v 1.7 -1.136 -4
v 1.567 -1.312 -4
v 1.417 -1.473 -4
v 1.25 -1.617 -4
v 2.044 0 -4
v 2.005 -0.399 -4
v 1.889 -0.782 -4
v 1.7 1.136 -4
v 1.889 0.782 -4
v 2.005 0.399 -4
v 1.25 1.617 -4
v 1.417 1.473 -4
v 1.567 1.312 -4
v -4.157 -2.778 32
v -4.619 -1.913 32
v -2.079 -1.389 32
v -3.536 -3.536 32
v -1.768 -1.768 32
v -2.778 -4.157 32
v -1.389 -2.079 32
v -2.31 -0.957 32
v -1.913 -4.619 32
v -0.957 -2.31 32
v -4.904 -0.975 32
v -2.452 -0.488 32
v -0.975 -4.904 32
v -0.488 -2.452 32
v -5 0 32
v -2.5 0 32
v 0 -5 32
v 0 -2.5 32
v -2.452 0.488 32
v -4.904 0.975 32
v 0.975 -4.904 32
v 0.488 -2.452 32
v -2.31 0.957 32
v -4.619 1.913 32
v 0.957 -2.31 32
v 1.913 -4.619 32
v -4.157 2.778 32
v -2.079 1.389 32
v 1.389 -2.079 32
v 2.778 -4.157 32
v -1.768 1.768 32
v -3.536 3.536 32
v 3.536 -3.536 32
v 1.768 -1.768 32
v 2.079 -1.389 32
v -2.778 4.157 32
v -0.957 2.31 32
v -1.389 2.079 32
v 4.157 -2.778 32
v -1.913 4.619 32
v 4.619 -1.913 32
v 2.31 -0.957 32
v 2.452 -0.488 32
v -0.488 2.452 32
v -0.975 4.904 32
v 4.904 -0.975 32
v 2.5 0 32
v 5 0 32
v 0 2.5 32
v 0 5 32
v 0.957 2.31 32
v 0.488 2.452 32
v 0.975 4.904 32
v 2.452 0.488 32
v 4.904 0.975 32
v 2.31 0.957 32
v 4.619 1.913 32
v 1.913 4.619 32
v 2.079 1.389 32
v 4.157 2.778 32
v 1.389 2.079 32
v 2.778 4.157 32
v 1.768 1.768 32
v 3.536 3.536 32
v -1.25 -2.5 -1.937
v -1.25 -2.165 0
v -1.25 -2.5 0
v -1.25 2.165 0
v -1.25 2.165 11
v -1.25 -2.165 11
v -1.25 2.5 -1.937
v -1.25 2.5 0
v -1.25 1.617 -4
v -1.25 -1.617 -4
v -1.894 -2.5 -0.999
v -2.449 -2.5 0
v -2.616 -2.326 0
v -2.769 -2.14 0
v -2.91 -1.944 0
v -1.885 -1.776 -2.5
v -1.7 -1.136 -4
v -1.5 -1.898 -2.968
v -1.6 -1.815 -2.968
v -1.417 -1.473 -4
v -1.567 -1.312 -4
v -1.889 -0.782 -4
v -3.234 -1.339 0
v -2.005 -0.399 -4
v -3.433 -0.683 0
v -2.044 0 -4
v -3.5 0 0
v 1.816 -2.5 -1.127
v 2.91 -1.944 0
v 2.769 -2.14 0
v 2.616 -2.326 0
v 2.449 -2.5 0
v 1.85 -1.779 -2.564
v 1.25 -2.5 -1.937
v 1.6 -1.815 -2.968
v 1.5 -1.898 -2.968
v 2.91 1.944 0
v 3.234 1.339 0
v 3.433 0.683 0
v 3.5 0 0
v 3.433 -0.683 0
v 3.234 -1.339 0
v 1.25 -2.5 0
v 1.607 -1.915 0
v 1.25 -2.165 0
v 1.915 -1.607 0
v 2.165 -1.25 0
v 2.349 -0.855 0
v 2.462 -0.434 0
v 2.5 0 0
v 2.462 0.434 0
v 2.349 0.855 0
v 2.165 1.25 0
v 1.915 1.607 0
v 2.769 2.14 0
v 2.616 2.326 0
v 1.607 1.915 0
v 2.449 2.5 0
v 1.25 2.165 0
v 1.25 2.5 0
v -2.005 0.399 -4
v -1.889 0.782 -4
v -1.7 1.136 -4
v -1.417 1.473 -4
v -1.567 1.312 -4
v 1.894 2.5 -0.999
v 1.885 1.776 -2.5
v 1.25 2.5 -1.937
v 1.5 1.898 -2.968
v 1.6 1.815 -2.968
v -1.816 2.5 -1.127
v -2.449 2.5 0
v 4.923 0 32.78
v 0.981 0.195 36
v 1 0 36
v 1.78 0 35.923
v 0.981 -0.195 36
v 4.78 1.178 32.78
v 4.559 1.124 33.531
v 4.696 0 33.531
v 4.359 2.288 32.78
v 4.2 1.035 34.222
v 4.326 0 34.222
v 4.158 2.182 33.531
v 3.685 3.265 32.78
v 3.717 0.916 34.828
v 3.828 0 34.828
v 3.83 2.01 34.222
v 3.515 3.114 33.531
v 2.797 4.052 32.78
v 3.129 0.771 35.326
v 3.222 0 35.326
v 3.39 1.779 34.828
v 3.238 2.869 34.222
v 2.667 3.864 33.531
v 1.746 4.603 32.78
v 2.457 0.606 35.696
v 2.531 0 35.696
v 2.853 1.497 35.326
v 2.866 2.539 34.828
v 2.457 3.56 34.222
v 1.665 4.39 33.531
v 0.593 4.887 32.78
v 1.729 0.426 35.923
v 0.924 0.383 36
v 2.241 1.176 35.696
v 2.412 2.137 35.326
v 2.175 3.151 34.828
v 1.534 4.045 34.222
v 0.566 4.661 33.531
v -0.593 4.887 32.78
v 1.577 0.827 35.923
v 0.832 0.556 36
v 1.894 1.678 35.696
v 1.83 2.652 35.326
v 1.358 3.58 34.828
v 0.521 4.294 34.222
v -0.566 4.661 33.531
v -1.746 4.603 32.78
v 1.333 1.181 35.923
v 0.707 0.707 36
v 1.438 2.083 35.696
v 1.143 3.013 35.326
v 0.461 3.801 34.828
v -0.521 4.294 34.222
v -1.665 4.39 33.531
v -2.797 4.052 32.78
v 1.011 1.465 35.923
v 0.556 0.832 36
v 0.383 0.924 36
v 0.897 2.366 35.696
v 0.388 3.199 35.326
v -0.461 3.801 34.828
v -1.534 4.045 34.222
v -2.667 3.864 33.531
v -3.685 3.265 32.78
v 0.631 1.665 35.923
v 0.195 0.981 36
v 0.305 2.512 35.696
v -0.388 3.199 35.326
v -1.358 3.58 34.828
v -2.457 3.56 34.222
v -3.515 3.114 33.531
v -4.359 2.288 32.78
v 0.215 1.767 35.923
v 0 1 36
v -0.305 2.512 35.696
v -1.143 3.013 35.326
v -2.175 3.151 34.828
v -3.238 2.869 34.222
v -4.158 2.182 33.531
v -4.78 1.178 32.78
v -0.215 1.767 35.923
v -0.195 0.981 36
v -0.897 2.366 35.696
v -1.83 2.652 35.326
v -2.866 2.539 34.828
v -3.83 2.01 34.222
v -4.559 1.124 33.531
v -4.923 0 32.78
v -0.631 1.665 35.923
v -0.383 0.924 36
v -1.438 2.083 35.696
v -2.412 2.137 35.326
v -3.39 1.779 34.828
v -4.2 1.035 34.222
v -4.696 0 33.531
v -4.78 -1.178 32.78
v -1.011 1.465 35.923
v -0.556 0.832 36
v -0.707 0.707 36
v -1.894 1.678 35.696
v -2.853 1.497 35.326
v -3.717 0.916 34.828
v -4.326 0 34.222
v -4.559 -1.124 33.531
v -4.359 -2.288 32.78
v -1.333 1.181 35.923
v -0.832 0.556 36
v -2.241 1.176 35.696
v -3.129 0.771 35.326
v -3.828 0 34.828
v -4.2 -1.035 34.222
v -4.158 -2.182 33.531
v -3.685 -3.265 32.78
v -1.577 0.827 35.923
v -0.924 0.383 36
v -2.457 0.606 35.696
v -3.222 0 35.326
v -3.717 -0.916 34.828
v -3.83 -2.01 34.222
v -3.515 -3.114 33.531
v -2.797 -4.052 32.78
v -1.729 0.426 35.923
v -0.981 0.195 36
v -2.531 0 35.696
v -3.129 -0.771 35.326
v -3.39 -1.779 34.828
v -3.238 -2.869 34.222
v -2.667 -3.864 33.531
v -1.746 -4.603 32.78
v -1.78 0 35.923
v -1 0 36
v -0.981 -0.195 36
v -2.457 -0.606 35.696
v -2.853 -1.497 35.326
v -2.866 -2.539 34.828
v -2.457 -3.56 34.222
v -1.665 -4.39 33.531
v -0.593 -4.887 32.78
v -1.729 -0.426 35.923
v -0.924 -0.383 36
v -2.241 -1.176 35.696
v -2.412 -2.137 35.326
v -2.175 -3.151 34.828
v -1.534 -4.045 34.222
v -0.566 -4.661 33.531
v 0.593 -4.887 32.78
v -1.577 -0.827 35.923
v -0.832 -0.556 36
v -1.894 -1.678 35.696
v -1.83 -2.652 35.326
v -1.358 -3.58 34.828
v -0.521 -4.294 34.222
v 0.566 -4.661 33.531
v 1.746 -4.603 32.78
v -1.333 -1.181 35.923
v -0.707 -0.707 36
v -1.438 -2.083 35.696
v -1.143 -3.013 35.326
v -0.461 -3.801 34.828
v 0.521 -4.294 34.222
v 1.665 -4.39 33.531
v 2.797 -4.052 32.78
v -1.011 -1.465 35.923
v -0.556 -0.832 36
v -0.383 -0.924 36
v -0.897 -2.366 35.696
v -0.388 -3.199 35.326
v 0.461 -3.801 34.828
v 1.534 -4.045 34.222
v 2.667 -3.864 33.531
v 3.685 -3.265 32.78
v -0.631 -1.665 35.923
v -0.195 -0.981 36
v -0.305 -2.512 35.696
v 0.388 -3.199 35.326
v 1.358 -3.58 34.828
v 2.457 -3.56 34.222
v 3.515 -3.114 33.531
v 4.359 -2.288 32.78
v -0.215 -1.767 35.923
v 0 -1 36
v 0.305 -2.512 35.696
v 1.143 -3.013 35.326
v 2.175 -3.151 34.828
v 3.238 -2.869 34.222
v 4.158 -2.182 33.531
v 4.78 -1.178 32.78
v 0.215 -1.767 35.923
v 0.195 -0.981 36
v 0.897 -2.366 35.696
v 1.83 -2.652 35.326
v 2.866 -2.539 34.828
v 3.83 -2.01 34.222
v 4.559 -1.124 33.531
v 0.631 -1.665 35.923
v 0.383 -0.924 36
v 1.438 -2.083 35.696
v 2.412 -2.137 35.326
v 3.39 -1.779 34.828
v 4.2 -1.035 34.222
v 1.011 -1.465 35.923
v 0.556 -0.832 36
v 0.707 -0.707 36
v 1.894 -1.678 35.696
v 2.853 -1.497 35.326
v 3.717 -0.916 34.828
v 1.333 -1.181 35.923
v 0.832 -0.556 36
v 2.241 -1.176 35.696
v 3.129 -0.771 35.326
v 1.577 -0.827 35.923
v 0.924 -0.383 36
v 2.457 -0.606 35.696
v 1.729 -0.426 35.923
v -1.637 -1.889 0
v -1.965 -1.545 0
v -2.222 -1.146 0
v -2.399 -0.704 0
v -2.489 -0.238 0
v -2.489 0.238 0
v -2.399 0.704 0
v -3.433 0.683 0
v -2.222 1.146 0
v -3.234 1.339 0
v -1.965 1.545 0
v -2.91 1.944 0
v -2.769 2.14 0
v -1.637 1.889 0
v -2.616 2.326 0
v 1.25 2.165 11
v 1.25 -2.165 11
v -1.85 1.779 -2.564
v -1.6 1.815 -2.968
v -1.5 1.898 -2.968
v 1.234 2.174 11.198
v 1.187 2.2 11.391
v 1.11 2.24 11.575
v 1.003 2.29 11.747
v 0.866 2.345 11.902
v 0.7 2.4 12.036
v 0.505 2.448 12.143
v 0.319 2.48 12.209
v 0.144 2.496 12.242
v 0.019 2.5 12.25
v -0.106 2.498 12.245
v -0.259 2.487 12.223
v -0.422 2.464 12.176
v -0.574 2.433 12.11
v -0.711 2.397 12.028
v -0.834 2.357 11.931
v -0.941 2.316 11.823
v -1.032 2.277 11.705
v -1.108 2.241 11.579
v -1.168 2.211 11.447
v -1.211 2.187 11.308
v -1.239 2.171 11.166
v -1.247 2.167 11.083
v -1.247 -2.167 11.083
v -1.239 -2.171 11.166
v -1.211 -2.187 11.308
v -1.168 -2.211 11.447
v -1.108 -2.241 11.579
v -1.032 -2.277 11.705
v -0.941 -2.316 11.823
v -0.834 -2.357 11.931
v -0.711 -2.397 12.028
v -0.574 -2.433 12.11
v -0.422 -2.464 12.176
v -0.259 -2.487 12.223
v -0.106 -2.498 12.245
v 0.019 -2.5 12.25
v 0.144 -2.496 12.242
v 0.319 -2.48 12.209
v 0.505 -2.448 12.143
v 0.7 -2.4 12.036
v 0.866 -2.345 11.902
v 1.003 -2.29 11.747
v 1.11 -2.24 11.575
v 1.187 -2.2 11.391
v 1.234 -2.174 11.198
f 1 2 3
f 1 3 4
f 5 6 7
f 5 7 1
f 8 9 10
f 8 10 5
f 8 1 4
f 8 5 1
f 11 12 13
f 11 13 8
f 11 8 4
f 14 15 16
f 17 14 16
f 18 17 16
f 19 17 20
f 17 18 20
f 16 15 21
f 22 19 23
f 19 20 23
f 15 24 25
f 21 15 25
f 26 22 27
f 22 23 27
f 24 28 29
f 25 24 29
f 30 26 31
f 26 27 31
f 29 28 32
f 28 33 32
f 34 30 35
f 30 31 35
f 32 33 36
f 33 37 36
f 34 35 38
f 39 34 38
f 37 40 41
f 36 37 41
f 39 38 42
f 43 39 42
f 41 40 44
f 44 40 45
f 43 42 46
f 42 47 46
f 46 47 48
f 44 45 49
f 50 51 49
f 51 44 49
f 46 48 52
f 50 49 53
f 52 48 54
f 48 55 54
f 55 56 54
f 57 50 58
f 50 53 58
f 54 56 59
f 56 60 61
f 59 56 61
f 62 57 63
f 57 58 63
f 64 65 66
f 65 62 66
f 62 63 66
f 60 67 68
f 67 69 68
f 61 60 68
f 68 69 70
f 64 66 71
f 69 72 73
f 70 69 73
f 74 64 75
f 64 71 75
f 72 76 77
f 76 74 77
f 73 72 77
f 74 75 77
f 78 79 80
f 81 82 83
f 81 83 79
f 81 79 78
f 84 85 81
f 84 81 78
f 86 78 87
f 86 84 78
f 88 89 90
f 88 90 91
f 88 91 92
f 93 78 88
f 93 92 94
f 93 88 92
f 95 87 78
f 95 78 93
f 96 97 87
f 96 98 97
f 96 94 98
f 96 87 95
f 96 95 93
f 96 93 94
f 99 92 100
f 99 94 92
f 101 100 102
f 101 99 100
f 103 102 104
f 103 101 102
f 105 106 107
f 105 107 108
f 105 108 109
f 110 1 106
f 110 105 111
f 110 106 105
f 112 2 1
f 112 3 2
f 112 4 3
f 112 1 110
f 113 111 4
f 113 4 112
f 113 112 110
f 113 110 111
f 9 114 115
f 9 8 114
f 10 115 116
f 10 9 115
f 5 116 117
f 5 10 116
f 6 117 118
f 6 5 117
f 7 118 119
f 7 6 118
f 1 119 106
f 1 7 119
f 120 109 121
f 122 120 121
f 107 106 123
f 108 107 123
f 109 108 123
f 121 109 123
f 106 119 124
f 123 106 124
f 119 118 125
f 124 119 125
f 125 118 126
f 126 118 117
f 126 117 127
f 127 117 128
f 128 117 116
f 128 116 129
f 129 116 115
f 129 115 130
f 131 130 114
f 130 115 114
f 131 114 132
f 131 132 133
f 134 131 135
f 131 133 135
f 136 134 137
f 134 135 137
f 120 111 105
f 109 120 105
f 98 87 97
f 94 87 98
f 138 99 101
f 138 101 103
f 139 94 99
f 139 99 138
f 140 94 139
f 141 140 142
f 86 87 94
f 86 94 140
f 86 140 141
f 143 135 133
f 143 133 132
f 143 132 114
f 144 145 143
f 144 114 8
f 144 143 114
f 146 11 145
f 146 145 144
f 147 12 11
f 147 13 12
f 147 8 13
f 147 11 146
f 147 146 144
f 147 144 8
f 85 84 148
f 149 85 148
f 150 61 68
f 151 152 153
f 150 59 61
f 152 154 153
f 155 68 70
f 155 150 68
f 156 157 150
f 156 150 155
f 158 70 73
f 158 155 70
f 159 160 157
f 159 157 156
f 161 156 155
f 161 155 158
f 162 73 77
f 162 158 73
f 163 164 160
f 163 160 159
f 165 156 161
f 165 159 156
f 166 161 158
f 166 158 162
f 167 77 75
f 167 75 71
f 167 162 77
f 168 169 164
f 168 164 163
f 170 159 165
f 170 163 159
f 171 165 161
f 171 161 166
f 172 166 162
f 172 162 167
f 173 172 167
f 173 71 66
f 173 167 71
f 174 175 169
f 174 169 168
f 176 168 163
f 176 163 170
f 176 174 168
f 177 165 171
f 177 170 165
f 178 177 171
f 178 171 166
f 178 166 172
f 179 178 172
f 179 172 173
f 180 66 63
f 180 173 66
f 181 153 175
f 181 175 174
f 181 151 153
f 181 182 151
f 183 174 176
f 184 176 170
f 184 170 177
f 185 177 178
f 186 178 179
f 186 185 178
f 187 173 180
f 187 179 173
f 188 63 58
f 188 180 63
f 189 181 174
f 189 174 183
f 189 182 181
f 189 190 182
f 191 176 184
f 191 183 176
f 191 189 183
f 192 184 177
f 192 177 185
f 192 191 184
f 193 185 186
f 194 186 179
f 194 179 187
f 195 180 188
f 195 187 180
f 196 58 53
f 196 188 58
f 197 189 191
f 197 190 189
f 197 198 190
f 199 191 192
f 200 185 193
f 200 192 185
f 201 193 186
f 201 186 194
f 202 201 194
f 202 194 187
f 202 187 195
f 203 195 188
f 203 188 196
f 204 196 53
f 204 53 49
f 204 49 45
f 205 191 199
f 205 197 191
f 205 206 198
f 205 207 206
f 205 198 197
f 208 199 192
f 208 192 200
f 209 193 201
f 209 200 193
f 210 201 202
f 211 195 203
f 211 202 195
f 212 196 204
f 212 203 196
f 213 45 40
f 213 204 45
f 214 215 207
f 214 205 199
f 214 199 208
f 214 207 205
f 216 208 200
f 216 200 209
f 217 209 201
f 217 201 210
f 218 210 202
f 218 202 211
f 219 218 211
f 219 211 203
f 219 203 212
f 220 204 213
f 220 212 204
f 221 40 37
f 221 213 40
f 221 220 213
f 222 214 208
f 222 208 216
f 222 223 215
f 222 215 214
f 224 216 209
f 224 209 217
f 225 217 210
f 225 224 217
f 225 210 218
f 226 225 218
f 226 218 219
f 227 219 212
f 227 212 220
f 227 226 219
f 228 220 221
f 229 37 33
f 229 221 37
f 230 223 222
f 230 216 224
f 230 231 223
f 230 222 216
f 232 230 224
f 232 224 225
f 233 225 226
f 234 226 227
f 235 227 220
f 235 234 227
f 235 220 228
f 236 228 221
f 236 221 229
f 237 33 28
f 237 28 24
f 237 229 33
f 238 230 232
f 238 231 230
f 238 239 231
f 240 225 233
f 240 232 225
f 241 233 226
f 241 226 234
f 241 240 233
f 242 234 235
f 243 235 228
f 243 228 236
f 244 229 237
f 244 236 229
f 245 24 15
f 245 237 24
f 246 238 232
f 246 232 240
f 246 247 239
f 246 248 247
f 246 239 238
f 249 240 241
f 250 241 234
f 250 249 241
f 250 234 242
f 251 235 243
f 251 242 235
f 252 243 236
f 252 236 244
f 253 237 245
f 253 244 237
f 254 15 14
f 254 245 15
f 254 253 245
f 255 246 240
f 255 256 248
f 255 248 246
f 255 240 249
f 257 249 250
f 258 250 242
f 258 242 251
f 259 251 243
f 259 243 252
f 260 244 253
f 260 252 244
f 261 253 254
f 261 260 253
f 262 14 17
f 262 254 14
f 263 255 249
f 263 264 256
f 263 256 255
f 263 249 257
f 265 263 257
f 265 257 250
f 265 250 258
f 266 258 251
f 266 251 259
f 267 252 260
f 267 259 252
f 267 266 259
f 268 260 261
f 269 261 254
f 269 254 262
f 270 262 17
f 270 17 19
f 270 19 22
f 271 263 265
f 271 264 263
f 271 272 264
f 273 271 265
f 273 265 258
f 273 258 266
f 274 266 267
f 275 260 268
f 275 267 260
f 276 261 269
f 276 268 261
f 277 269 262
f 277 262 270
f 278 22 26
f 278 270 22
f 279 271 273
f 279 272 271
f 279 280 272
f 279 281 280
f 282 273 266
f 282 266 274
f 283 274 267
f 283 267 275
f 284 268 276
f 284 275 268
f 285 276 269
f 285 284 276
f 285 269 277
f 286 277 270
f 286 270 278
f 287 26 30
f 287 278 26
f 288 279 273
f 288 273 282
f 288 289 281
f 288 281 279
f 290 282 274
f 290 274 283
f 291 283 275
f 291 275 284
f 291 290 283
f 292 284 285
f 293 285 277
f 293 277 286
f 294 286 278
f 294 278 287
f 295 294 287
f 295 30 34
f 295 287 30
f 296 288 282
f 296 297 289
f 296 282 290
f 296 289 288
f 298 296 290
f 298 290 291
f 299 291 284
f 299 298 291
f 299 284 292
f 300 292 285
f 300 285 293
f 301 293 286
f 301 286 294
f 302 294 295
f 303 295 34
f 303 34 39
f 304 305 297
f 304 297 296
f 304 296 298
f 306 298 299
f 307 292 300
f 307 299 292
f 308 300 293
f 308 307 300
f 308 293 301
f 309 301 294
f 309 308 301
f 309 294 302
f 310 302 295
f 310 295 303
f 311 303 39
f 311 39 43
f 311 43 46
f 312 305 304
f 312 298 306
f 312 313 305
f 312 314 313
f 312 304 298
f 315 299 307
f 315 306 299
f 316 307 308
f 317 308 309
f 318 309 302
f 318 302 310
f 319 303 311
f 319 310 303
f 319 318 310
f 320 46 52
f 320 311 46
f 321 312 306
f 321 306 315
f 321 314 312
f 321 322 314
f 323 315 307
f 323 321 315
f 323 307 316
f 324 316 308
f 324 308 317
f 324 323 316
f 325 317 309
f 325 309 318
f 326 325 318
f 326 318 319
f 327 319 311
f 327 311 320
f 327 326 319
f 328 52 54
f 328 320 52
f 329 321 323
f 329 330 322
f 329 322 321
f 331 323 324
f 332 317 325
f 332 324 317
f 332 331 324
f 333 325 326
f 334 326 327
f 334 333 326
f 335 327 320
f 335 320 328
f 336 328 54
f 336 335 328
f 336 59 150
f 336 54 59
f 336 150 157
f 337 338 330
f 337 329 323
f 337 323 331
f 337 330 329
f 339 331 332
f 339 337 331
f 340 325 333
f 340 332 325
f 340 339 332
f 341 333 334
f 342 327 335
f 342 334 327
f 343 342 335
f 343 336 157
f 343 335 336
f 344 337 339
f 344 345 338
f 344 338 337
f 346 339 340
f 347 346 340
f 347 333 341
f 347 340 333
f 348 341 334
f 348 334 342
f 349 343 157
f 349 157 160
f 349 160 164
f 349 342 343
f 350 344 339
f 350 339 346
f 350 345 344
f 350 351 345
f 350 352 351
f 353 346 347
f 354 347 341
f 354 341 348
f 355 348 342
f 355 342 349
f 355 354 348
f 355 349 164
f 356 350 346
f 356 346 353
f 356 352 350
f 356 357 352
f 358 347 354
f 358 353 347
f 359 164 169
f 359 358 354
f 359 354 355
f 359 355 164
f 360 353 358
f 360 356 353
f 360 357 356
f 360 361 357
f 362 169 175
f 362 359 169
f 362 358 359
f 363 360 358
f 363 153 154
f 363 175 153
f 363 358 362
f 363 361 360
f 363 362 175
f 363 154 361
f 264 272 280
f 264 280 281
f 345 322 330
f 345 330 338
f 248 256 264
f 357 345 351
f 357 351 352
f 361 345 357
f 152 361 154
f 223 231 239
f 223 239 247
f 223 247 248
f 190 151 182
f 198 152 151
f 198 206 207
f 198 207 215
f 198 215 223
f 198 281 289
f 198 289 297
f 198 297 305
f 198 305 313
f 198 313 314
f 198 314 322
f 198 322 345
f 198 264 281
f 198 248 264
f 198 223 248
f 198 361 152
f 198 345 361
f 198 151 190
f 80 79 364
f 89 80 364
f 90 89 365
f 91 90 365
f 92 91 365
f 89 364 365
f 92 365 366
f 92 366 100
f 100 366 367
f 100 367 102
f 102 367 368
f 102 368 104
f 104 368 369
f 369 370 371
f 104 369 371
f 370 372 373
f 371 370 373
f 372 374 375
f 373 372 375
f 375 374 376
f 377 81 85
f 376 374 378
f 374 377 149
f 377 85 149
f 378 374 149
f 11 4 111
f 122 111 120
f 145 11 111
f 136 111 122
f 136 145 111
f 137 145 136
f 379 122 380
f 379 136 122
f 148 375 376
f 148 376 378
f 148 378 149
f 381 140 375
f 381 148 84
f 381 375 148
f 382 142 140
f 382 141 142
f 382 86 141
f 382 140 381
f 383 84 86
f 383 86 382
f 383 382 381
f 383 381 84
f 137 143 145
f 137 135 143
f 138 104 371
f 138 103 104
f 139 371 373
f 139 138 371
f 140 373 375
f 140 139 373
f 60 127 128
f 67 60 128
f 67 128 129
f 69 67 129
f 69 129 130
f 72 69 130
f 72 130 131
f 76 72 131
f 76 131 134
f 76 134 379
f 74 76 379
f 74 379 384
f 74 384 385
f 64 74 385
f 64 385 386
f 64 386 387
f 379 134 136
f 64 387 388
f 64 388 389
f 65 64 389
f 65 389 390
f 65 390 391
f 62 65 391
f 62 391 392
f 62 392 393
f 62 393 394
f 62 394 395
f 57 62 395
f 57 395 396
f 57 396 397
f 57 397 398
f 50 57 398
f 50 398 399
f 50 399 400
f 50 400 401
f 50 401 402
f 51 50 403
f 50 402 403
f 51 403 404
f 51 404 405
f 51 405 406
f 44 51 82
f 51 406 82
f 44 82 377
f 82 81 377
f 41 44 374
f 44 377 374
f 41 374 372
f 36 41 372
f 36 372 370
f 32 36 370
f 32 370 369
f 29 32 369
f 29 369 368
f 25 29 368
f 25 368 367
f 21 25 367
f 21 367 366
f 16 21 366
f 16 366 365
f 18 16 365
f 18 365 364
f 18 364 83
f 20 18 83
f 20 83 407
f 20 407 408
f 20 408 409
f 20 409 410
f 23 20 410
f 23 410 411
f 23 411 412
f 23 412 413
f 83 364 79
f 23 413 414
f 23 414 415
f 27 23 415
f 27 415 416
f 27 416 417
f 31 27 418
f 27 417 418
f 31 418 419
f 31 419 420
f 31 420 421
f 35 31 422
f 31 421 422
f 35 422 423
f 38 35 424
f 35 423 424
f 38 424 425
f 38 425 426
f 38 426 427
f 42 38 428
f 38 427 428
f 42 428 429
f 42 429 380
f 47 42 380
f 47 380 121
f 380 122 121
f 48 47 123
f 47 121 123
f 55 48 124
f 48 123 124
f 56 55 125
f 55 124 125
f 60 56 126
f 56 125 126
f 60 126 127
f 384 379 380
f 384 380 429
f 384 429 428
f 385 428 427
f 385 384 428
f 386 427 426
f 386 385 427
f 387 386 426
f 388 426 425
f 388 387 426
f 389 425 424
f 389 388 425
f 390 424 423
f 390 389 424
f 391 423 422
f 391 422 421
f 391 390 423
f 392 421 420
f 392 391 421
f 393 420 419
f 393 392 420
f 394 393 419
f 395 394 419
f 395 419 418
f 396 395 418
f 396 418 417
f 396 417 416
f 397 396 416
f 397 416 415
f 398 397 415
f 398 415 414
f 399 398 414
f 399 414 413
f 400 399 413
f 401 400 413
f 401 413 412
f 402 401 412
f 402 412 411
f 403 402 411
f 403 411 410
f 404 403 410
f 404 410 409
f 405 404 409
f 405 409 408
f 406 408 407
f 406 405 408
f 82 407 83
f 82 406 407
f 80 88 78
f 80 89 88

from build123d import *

# Parameters (mm, degrees)
SKETCH2_R           = 2.5
BOSS_EXTRUDE1_DEPTH = 32
BOSS_EXTRUDE2_DEPTH = 4
BOSS_EXTRUDE2_TAPER = 20
CUT_EXTRUDE1_DEPTH  = 6
CUT_EXTRUDE2_DEPTH  = 6
SKETCH6_R           = 5
BOSS_EXTRUDE3_DEPTH = 4
FILLET1_R           = 4


with BuildPart() as part:
    # Sketch2 → Boss-Extrude1 (new body)
    with BuildSketch(Plane.XY):
        Circle(SKETCH2_R)
    extrude(amount=BOSS_EXTRUDE1_DEPTH)

    # Sketch3 → Boss-Extrude2 (add)
    with BuildSketch(Plane(origin=(0, 0, 0), x_dir=(-1, 0, 0), z_dir=(0, 0, -1))):
        with BuildLine():
            ThreePointArc((2.910177967, 1.944444444), (0, 3.5), (-2.910177967, 1.944444444))
            ThreePointArc((-2.910177967, 1.944444444), (-3.5, 0), (-2.910177967, -1.944444444))
            ThreePointArc((-2.910177967, -1.944444444), (0, -3.5), (2.910177967, -1.944444444))
            ThreePointArc((2.910177967, -1.944444444), (3.349300142, -1.015966809), (3.5, 0))
            ThreePointArc((3.5, 0), (3.349300142, 1.015966809), (2.910177967, 1.944444444))
        make_face()
    extrude(amount=BOSS_EXTRUDE2_DEPTH, taper=BOSS_EXTRUDE2_TAPER)

    # Sketch4 → Cut-Extrude1 (cut)
    with BuildSketch(Plane.XY):
        Polygon((4.702019348, 2.5), (-6.119643092, 2.5), (-4.730091105, -2.5), (5.600315582, -2.5), (7.628500047, -1.168486898), (5.144149526, -5.126604677), (-5.530136189, -4.719564196), (-7.70569738, 3.519496572), (-2.540721352, 4.883331809), (4.16163802, 4.824833286), (4.784967696, 2.464223482), align=None)
    extrude(amount=-CUT_EXTRUDE1_DEPTH, mode=Mode.SUBTRACT)

    # Sketch5 → Cut-Extrude2 (cut)
    with BuildSketch(Plane(origin=(0, 2.5, 0), x_dir=(1, 0, 0), z_dir=(0, 1, 0))):
        with BuildLine():
            Line((1.25, 19), (1.25, -11))
            ThreePointArc((1.25, -11), (0, -12.25), (-1.25, -11))
            Line((-1.25, -11), (-1.25, 19))
            ThreePointArc((-1.25, 19), (0, 20.25), (1.25, 19))
        make_face()
    extrude(amount=-CUT_EXTRUDE2_DEPTH, mode=Mode.SUBTRACT)

    # Sketch6 → Boss-Extrude3 (add)
    with BuildSketch(Plane.XY.offset(32)):
        Circle(SKETCH6_R)
    extrude(amount=BOSS_EXTRUDE3_DEPTH)

    # Fillet1
    fillet1_edges = [part.edges().sort_by_distance(p)[0] for p in [
        (-5, 0, 36),
    ]]
    fillet(fillet1_edges, radius=FILLET1_R - 0.0001)  # a hair under: the kernel refuses the full size


solid = part.part
